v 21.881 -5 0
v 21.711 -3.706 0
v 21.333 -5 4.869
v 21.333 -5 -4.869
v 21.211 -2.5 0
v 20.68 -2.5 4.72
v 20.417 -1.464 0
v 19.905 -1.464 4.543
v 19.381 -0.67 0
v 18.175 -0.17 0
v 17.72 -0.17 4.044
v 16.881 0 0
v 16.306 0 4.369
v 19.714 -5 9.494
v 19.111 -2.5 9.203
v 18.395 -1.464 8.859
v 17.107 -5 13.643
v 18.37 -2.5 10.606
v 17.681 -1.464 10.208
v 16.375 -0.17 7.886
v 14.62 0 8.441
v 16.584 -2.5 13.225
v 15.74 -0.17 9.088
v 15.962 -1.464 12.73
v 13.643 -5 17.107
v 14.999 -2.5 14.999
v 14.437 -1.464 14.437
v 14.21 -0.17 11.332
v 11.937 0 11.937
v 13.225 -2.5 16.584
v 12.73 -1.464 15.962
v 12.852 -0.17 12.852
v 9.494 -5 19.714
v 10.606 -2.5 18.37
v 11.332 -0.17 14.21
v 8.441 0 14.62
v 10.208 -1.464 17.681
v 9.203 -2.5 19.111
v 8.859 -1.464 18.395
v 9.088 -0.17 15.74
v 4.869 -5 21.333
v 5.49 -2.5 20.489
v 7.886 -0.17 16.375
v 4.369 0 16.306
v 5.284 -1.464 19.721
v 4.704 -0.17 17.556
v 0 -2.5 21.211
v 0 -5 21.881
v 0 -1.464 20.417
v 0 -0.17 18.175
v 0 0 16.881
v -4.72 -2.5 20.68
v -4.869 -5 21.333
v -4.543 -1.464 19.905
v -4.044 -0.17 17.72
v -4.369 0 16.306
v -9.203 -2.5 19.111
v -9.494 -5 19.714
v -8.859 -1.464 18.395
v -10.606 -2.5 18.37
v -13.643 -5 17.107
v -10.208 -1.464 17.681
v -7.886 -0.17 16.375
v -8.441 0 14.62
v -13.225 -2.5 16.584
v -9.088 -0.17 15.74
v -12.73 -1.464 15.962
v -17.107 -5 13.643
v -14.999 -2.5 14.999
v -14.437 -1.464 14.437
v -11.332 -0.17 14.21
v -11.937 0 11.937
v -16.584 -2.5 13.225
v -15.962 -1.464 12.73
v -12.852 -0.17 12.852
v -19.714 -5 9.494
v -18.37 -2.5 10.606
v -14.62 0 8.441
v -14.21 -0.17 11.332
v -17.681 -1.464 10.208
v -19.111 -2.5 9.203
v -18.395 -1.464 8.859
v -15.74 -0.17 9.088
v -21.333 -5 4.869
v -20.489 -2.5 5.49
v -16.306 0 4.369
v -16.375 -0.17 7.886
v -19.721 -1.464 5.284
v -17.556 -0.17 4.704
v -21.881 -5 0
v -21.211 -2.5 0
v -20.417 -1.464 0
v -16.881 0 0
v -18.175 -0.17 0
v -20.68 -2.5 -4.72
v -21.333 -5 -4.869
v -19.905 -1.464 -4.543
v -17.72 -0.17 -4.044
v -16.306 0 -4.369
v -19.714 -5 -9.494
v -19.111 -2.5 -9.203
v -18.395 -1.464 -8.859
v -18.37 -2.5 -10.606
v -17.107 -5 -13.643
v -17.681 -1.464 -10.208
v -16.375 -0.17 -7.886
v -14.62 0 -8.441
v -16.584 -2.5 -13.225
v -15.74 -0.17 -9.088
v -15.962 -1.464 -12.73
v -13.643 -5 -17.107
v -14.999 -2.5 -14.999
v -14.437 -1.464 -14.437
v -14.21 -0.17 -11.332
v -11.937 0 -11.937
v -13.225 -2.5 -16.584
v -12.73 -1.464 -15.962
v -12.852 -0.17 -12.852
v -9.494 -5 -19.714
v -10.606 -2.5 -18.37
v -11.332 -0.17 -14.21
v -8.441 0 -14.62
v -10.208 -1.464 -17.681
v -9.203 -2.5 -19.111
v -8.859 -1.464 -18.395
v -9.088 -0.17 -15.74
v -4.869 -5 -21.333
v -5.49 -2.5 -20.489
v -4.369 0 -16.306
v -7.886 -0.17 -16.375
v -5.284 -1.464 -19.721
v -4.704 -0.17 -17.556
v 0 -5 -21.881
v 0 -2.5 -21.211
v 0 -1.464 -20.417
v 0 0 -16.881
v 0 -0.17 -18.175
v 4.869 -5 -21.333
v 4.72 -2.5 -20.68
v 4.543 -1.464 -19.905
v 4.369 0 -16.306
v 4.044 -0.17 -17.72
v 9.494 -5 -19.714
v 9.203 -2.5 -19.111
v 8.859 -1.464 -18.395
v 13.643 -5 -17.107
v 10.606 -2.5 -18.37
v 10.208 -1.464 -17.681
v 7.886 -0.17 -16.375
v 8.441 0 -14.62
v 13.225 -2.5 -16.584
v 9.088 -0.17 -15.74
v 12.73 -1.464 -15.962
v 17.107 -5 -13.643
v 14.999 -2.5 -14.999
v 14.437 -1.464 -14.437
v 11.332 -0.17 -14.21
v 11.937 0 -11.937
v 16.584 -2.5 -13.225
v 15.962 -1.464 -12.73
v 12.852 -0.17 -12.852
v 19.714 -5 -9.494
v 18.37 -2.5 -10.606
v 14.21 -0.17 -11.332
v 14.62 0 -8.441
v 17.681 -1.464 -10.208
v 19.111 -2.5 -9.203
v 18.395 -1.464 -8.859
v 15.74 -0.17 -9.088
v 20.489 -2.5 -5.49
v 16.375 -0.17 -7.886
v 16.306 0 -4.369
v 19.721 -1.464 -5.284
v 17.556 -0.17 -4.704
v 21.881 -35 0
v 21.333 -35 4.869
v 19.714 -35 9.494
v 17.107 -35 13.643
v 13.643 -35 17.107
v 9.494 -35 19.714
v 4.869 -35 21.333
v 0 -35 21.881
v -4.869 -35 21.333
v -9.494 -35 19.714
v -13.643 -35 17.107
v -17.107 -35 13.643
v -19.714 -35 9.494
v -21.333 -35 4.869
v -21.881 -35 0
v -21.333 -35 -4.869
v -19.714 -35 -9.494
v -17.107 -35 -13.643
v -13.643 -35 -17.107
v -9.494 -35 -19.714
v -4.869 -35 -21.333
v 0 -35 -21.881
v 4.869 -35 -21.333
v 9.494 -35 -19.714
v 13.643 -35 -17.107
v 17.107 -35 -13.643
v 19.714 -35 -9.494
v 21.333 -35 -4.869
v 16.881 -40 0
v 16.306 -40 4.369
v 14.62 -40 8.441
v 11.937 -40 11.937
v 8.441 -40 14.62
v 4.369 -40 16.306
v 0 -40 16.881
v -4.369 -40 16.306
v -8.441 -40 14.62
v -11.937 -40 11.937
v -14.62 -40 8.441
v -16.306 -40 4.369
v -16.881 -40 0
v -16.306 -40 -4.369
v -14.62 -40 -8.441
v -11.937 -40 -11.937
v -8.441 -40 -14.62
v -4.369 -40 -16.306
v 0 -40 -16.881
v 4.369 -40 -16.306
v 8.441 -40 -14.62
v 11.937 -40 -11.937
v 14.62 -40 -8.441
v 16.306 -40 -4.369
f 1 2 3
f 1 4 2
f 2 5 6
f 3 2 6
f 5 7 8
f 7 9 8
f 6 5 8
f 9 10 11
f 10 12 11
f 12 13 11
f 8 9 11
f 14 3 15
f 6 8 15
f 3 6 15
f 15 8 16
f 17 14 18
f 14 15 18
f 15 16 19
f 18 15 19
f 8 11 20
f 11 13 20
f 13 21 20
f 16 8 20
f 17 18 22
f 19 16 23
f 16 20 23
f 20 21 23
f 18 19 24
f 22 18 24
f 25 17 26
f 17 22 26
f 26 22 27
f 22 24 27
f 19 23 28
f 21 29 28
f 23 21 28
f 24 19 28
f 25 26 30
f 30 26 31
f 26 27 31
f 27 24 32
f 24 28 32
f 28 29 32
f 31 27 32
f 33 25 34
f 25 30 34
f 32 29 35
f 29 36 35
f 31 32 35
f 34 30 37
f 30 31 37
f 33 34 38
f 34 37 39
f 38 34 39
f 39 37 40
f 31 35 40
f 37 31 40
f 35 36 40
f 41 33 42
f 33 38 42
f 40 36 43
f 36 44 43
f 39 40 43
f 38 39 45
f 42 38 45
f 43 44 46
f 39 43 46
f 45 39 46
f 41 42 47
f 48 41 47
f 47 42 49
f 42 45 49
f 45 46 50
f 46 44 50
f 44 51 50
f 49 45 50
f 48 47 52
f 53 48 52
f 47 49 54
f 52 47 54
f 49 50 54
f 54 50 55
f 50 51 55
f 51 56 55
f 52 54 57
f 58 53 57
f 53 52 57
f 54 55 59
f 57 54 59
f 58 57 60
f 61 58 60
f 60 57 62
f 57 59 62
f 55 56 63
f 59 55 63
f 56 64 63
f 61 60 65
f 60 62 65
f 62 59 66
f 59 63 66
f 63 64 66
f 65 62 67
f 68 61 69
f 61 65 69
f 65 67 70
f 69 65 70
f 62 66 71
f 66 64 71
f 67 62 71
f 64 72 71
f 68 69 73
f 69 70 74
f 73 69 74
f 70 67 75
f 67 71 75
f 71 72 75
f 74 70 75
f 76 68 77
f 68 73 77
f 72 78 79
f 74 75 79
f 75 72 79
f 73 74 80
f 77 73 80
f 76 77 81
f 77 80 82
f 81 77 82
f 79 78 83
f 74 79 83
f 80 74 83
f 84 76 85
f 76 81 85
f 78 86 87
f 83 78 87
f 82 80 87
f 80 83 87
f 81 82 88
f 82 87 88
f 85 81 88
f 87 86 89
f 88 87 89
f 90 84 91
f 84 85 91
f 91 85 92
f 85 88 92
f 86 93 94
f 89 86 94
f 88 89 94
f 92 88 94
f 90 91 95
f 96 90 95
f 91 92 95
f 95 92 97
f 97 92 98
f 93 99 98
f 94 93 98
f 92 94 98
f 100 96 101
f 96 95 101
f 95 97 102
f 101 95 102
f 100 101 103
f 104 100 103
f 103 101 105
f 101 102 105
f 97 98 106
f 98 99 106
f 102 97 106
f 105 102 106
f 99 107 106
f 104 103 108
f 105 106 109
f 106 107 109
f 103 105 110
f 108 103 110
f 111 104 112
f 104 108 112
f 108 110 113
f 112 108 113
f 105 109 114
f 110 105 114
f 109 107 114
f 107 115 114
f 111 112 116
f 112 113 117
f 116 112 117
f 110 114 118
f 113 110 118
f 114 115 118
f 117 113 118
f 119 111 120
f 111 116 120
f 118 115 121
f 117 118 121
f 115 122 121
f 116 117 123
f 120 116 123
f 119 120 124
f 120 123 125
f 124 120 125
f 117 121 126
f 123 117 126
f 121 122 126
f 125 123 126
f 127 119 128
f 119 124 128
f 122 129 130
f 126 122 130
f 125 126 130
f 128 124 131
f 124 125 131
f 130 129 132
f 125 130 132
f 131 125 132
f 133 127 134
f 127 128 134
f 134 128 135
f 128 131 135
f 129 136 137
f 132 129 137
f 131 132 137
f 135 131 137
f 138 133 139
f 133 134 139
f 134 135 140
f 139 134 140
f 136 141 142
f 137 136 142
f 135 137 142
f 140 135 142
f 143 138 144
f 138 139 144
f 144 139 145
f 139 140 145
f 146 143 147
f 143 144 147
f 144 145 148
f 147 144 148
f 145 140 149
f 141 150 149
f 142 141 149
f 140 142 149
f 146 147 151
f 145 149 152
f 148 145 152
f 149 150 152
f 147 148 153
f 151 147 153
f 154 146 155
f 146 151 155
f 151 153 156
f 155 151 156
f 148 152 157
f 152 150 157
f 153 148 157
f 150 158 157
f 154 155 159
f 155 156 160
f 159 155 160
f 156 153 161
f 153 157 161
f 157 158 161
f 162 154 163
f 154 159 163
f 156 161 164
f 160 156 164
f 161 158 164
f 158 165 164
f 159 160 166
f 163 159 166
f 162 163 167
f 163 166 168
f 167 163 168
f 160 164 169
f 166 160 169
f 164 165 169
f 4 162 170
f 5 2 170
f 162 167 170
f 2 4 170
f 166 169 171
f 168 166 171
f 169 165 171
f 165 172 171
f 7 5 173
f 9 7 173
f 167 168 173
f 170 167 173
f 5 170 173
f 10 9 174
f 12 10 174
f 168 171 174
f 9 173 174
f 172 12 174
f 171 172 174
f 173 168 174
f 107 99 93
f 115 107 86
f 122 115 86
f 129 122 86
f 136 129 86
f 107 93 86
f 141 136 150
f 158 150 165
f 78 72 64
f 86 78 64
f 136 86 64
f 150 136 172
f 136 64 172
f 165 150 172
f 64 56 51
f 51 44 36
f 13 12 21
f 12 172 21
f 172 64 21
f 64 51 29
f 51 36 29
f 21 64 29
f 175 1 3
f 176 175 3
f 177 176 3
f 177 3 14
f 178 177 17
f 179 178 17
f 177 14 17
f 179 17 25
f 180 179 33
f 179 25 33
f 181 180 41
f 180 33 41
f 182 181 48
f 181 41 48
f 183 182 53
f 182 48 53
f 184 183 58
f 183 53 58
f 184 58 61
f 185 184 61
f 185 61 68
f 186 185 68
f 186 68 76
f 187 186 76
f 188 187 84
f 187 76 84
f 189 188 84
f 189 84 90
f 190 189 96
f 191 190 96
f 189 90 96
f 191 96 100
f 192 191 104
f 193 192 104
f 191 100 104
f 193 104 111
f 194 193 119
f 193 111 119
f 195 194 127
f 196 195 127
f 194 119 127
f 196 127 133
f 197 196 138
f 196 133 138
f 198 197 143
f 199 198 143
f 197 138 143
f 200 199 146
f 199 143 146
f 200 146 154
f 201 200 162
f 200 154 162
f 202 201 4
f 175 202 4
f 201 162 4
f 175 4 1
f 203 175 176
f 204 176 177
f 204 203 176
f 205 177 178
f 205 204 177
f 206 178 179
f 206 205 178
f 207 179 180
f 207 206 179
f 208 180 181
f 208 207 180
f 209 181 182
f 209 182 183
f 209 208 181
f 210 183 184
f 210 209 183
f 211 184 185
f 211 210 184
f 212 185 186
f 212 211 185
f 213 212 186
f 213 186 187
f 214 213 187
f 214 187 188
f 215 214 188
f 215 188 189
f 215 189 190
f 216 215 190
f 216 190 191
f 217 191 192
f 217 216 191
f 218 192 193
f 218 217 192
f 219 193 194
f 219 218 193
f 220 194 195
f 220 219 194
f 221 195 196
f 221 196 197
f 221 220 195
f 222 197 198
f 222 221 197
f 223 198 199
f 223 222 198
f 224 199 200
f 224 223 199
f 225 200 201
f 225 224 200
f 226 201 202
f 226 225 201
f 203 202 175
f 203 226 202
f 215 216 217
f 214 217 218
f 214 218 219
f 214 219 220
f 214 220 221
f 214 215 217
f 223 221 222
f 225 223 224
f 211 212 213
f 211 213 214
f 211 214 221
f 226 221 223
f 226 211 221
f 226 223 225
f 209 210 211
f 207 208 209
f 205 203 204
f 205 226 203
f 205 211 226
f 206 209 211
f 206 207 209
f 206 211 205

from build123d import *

# Parameters (mm, degrees)
F0_R     = 21.881229
F1_DEPTH = 40
F2_SIZE  = 5
F3_R     = 5


with BuildPart() as f1:
    # F0 (on Front) → F1 (new body)
    with BuildSketch(Plane.XZ):
        Circle(F0_R)
    extrude(amount=F1_DEPTH)

    # F2
    f2_edges = [f1.edges().sort_by_distance(p)[0] for p in [
        (-21.881229, -40, 0),
    ]]
    chamfer(f2_edges, length=F2_SIZE)

    # F3
    f3_edges = [f1.edges().sort_by_distance(p)[0] for p in [
        (-21.881229, 0, 0),
    ]]
    fillet(f3_edges, radius=F3_R)


solid = f1.part
